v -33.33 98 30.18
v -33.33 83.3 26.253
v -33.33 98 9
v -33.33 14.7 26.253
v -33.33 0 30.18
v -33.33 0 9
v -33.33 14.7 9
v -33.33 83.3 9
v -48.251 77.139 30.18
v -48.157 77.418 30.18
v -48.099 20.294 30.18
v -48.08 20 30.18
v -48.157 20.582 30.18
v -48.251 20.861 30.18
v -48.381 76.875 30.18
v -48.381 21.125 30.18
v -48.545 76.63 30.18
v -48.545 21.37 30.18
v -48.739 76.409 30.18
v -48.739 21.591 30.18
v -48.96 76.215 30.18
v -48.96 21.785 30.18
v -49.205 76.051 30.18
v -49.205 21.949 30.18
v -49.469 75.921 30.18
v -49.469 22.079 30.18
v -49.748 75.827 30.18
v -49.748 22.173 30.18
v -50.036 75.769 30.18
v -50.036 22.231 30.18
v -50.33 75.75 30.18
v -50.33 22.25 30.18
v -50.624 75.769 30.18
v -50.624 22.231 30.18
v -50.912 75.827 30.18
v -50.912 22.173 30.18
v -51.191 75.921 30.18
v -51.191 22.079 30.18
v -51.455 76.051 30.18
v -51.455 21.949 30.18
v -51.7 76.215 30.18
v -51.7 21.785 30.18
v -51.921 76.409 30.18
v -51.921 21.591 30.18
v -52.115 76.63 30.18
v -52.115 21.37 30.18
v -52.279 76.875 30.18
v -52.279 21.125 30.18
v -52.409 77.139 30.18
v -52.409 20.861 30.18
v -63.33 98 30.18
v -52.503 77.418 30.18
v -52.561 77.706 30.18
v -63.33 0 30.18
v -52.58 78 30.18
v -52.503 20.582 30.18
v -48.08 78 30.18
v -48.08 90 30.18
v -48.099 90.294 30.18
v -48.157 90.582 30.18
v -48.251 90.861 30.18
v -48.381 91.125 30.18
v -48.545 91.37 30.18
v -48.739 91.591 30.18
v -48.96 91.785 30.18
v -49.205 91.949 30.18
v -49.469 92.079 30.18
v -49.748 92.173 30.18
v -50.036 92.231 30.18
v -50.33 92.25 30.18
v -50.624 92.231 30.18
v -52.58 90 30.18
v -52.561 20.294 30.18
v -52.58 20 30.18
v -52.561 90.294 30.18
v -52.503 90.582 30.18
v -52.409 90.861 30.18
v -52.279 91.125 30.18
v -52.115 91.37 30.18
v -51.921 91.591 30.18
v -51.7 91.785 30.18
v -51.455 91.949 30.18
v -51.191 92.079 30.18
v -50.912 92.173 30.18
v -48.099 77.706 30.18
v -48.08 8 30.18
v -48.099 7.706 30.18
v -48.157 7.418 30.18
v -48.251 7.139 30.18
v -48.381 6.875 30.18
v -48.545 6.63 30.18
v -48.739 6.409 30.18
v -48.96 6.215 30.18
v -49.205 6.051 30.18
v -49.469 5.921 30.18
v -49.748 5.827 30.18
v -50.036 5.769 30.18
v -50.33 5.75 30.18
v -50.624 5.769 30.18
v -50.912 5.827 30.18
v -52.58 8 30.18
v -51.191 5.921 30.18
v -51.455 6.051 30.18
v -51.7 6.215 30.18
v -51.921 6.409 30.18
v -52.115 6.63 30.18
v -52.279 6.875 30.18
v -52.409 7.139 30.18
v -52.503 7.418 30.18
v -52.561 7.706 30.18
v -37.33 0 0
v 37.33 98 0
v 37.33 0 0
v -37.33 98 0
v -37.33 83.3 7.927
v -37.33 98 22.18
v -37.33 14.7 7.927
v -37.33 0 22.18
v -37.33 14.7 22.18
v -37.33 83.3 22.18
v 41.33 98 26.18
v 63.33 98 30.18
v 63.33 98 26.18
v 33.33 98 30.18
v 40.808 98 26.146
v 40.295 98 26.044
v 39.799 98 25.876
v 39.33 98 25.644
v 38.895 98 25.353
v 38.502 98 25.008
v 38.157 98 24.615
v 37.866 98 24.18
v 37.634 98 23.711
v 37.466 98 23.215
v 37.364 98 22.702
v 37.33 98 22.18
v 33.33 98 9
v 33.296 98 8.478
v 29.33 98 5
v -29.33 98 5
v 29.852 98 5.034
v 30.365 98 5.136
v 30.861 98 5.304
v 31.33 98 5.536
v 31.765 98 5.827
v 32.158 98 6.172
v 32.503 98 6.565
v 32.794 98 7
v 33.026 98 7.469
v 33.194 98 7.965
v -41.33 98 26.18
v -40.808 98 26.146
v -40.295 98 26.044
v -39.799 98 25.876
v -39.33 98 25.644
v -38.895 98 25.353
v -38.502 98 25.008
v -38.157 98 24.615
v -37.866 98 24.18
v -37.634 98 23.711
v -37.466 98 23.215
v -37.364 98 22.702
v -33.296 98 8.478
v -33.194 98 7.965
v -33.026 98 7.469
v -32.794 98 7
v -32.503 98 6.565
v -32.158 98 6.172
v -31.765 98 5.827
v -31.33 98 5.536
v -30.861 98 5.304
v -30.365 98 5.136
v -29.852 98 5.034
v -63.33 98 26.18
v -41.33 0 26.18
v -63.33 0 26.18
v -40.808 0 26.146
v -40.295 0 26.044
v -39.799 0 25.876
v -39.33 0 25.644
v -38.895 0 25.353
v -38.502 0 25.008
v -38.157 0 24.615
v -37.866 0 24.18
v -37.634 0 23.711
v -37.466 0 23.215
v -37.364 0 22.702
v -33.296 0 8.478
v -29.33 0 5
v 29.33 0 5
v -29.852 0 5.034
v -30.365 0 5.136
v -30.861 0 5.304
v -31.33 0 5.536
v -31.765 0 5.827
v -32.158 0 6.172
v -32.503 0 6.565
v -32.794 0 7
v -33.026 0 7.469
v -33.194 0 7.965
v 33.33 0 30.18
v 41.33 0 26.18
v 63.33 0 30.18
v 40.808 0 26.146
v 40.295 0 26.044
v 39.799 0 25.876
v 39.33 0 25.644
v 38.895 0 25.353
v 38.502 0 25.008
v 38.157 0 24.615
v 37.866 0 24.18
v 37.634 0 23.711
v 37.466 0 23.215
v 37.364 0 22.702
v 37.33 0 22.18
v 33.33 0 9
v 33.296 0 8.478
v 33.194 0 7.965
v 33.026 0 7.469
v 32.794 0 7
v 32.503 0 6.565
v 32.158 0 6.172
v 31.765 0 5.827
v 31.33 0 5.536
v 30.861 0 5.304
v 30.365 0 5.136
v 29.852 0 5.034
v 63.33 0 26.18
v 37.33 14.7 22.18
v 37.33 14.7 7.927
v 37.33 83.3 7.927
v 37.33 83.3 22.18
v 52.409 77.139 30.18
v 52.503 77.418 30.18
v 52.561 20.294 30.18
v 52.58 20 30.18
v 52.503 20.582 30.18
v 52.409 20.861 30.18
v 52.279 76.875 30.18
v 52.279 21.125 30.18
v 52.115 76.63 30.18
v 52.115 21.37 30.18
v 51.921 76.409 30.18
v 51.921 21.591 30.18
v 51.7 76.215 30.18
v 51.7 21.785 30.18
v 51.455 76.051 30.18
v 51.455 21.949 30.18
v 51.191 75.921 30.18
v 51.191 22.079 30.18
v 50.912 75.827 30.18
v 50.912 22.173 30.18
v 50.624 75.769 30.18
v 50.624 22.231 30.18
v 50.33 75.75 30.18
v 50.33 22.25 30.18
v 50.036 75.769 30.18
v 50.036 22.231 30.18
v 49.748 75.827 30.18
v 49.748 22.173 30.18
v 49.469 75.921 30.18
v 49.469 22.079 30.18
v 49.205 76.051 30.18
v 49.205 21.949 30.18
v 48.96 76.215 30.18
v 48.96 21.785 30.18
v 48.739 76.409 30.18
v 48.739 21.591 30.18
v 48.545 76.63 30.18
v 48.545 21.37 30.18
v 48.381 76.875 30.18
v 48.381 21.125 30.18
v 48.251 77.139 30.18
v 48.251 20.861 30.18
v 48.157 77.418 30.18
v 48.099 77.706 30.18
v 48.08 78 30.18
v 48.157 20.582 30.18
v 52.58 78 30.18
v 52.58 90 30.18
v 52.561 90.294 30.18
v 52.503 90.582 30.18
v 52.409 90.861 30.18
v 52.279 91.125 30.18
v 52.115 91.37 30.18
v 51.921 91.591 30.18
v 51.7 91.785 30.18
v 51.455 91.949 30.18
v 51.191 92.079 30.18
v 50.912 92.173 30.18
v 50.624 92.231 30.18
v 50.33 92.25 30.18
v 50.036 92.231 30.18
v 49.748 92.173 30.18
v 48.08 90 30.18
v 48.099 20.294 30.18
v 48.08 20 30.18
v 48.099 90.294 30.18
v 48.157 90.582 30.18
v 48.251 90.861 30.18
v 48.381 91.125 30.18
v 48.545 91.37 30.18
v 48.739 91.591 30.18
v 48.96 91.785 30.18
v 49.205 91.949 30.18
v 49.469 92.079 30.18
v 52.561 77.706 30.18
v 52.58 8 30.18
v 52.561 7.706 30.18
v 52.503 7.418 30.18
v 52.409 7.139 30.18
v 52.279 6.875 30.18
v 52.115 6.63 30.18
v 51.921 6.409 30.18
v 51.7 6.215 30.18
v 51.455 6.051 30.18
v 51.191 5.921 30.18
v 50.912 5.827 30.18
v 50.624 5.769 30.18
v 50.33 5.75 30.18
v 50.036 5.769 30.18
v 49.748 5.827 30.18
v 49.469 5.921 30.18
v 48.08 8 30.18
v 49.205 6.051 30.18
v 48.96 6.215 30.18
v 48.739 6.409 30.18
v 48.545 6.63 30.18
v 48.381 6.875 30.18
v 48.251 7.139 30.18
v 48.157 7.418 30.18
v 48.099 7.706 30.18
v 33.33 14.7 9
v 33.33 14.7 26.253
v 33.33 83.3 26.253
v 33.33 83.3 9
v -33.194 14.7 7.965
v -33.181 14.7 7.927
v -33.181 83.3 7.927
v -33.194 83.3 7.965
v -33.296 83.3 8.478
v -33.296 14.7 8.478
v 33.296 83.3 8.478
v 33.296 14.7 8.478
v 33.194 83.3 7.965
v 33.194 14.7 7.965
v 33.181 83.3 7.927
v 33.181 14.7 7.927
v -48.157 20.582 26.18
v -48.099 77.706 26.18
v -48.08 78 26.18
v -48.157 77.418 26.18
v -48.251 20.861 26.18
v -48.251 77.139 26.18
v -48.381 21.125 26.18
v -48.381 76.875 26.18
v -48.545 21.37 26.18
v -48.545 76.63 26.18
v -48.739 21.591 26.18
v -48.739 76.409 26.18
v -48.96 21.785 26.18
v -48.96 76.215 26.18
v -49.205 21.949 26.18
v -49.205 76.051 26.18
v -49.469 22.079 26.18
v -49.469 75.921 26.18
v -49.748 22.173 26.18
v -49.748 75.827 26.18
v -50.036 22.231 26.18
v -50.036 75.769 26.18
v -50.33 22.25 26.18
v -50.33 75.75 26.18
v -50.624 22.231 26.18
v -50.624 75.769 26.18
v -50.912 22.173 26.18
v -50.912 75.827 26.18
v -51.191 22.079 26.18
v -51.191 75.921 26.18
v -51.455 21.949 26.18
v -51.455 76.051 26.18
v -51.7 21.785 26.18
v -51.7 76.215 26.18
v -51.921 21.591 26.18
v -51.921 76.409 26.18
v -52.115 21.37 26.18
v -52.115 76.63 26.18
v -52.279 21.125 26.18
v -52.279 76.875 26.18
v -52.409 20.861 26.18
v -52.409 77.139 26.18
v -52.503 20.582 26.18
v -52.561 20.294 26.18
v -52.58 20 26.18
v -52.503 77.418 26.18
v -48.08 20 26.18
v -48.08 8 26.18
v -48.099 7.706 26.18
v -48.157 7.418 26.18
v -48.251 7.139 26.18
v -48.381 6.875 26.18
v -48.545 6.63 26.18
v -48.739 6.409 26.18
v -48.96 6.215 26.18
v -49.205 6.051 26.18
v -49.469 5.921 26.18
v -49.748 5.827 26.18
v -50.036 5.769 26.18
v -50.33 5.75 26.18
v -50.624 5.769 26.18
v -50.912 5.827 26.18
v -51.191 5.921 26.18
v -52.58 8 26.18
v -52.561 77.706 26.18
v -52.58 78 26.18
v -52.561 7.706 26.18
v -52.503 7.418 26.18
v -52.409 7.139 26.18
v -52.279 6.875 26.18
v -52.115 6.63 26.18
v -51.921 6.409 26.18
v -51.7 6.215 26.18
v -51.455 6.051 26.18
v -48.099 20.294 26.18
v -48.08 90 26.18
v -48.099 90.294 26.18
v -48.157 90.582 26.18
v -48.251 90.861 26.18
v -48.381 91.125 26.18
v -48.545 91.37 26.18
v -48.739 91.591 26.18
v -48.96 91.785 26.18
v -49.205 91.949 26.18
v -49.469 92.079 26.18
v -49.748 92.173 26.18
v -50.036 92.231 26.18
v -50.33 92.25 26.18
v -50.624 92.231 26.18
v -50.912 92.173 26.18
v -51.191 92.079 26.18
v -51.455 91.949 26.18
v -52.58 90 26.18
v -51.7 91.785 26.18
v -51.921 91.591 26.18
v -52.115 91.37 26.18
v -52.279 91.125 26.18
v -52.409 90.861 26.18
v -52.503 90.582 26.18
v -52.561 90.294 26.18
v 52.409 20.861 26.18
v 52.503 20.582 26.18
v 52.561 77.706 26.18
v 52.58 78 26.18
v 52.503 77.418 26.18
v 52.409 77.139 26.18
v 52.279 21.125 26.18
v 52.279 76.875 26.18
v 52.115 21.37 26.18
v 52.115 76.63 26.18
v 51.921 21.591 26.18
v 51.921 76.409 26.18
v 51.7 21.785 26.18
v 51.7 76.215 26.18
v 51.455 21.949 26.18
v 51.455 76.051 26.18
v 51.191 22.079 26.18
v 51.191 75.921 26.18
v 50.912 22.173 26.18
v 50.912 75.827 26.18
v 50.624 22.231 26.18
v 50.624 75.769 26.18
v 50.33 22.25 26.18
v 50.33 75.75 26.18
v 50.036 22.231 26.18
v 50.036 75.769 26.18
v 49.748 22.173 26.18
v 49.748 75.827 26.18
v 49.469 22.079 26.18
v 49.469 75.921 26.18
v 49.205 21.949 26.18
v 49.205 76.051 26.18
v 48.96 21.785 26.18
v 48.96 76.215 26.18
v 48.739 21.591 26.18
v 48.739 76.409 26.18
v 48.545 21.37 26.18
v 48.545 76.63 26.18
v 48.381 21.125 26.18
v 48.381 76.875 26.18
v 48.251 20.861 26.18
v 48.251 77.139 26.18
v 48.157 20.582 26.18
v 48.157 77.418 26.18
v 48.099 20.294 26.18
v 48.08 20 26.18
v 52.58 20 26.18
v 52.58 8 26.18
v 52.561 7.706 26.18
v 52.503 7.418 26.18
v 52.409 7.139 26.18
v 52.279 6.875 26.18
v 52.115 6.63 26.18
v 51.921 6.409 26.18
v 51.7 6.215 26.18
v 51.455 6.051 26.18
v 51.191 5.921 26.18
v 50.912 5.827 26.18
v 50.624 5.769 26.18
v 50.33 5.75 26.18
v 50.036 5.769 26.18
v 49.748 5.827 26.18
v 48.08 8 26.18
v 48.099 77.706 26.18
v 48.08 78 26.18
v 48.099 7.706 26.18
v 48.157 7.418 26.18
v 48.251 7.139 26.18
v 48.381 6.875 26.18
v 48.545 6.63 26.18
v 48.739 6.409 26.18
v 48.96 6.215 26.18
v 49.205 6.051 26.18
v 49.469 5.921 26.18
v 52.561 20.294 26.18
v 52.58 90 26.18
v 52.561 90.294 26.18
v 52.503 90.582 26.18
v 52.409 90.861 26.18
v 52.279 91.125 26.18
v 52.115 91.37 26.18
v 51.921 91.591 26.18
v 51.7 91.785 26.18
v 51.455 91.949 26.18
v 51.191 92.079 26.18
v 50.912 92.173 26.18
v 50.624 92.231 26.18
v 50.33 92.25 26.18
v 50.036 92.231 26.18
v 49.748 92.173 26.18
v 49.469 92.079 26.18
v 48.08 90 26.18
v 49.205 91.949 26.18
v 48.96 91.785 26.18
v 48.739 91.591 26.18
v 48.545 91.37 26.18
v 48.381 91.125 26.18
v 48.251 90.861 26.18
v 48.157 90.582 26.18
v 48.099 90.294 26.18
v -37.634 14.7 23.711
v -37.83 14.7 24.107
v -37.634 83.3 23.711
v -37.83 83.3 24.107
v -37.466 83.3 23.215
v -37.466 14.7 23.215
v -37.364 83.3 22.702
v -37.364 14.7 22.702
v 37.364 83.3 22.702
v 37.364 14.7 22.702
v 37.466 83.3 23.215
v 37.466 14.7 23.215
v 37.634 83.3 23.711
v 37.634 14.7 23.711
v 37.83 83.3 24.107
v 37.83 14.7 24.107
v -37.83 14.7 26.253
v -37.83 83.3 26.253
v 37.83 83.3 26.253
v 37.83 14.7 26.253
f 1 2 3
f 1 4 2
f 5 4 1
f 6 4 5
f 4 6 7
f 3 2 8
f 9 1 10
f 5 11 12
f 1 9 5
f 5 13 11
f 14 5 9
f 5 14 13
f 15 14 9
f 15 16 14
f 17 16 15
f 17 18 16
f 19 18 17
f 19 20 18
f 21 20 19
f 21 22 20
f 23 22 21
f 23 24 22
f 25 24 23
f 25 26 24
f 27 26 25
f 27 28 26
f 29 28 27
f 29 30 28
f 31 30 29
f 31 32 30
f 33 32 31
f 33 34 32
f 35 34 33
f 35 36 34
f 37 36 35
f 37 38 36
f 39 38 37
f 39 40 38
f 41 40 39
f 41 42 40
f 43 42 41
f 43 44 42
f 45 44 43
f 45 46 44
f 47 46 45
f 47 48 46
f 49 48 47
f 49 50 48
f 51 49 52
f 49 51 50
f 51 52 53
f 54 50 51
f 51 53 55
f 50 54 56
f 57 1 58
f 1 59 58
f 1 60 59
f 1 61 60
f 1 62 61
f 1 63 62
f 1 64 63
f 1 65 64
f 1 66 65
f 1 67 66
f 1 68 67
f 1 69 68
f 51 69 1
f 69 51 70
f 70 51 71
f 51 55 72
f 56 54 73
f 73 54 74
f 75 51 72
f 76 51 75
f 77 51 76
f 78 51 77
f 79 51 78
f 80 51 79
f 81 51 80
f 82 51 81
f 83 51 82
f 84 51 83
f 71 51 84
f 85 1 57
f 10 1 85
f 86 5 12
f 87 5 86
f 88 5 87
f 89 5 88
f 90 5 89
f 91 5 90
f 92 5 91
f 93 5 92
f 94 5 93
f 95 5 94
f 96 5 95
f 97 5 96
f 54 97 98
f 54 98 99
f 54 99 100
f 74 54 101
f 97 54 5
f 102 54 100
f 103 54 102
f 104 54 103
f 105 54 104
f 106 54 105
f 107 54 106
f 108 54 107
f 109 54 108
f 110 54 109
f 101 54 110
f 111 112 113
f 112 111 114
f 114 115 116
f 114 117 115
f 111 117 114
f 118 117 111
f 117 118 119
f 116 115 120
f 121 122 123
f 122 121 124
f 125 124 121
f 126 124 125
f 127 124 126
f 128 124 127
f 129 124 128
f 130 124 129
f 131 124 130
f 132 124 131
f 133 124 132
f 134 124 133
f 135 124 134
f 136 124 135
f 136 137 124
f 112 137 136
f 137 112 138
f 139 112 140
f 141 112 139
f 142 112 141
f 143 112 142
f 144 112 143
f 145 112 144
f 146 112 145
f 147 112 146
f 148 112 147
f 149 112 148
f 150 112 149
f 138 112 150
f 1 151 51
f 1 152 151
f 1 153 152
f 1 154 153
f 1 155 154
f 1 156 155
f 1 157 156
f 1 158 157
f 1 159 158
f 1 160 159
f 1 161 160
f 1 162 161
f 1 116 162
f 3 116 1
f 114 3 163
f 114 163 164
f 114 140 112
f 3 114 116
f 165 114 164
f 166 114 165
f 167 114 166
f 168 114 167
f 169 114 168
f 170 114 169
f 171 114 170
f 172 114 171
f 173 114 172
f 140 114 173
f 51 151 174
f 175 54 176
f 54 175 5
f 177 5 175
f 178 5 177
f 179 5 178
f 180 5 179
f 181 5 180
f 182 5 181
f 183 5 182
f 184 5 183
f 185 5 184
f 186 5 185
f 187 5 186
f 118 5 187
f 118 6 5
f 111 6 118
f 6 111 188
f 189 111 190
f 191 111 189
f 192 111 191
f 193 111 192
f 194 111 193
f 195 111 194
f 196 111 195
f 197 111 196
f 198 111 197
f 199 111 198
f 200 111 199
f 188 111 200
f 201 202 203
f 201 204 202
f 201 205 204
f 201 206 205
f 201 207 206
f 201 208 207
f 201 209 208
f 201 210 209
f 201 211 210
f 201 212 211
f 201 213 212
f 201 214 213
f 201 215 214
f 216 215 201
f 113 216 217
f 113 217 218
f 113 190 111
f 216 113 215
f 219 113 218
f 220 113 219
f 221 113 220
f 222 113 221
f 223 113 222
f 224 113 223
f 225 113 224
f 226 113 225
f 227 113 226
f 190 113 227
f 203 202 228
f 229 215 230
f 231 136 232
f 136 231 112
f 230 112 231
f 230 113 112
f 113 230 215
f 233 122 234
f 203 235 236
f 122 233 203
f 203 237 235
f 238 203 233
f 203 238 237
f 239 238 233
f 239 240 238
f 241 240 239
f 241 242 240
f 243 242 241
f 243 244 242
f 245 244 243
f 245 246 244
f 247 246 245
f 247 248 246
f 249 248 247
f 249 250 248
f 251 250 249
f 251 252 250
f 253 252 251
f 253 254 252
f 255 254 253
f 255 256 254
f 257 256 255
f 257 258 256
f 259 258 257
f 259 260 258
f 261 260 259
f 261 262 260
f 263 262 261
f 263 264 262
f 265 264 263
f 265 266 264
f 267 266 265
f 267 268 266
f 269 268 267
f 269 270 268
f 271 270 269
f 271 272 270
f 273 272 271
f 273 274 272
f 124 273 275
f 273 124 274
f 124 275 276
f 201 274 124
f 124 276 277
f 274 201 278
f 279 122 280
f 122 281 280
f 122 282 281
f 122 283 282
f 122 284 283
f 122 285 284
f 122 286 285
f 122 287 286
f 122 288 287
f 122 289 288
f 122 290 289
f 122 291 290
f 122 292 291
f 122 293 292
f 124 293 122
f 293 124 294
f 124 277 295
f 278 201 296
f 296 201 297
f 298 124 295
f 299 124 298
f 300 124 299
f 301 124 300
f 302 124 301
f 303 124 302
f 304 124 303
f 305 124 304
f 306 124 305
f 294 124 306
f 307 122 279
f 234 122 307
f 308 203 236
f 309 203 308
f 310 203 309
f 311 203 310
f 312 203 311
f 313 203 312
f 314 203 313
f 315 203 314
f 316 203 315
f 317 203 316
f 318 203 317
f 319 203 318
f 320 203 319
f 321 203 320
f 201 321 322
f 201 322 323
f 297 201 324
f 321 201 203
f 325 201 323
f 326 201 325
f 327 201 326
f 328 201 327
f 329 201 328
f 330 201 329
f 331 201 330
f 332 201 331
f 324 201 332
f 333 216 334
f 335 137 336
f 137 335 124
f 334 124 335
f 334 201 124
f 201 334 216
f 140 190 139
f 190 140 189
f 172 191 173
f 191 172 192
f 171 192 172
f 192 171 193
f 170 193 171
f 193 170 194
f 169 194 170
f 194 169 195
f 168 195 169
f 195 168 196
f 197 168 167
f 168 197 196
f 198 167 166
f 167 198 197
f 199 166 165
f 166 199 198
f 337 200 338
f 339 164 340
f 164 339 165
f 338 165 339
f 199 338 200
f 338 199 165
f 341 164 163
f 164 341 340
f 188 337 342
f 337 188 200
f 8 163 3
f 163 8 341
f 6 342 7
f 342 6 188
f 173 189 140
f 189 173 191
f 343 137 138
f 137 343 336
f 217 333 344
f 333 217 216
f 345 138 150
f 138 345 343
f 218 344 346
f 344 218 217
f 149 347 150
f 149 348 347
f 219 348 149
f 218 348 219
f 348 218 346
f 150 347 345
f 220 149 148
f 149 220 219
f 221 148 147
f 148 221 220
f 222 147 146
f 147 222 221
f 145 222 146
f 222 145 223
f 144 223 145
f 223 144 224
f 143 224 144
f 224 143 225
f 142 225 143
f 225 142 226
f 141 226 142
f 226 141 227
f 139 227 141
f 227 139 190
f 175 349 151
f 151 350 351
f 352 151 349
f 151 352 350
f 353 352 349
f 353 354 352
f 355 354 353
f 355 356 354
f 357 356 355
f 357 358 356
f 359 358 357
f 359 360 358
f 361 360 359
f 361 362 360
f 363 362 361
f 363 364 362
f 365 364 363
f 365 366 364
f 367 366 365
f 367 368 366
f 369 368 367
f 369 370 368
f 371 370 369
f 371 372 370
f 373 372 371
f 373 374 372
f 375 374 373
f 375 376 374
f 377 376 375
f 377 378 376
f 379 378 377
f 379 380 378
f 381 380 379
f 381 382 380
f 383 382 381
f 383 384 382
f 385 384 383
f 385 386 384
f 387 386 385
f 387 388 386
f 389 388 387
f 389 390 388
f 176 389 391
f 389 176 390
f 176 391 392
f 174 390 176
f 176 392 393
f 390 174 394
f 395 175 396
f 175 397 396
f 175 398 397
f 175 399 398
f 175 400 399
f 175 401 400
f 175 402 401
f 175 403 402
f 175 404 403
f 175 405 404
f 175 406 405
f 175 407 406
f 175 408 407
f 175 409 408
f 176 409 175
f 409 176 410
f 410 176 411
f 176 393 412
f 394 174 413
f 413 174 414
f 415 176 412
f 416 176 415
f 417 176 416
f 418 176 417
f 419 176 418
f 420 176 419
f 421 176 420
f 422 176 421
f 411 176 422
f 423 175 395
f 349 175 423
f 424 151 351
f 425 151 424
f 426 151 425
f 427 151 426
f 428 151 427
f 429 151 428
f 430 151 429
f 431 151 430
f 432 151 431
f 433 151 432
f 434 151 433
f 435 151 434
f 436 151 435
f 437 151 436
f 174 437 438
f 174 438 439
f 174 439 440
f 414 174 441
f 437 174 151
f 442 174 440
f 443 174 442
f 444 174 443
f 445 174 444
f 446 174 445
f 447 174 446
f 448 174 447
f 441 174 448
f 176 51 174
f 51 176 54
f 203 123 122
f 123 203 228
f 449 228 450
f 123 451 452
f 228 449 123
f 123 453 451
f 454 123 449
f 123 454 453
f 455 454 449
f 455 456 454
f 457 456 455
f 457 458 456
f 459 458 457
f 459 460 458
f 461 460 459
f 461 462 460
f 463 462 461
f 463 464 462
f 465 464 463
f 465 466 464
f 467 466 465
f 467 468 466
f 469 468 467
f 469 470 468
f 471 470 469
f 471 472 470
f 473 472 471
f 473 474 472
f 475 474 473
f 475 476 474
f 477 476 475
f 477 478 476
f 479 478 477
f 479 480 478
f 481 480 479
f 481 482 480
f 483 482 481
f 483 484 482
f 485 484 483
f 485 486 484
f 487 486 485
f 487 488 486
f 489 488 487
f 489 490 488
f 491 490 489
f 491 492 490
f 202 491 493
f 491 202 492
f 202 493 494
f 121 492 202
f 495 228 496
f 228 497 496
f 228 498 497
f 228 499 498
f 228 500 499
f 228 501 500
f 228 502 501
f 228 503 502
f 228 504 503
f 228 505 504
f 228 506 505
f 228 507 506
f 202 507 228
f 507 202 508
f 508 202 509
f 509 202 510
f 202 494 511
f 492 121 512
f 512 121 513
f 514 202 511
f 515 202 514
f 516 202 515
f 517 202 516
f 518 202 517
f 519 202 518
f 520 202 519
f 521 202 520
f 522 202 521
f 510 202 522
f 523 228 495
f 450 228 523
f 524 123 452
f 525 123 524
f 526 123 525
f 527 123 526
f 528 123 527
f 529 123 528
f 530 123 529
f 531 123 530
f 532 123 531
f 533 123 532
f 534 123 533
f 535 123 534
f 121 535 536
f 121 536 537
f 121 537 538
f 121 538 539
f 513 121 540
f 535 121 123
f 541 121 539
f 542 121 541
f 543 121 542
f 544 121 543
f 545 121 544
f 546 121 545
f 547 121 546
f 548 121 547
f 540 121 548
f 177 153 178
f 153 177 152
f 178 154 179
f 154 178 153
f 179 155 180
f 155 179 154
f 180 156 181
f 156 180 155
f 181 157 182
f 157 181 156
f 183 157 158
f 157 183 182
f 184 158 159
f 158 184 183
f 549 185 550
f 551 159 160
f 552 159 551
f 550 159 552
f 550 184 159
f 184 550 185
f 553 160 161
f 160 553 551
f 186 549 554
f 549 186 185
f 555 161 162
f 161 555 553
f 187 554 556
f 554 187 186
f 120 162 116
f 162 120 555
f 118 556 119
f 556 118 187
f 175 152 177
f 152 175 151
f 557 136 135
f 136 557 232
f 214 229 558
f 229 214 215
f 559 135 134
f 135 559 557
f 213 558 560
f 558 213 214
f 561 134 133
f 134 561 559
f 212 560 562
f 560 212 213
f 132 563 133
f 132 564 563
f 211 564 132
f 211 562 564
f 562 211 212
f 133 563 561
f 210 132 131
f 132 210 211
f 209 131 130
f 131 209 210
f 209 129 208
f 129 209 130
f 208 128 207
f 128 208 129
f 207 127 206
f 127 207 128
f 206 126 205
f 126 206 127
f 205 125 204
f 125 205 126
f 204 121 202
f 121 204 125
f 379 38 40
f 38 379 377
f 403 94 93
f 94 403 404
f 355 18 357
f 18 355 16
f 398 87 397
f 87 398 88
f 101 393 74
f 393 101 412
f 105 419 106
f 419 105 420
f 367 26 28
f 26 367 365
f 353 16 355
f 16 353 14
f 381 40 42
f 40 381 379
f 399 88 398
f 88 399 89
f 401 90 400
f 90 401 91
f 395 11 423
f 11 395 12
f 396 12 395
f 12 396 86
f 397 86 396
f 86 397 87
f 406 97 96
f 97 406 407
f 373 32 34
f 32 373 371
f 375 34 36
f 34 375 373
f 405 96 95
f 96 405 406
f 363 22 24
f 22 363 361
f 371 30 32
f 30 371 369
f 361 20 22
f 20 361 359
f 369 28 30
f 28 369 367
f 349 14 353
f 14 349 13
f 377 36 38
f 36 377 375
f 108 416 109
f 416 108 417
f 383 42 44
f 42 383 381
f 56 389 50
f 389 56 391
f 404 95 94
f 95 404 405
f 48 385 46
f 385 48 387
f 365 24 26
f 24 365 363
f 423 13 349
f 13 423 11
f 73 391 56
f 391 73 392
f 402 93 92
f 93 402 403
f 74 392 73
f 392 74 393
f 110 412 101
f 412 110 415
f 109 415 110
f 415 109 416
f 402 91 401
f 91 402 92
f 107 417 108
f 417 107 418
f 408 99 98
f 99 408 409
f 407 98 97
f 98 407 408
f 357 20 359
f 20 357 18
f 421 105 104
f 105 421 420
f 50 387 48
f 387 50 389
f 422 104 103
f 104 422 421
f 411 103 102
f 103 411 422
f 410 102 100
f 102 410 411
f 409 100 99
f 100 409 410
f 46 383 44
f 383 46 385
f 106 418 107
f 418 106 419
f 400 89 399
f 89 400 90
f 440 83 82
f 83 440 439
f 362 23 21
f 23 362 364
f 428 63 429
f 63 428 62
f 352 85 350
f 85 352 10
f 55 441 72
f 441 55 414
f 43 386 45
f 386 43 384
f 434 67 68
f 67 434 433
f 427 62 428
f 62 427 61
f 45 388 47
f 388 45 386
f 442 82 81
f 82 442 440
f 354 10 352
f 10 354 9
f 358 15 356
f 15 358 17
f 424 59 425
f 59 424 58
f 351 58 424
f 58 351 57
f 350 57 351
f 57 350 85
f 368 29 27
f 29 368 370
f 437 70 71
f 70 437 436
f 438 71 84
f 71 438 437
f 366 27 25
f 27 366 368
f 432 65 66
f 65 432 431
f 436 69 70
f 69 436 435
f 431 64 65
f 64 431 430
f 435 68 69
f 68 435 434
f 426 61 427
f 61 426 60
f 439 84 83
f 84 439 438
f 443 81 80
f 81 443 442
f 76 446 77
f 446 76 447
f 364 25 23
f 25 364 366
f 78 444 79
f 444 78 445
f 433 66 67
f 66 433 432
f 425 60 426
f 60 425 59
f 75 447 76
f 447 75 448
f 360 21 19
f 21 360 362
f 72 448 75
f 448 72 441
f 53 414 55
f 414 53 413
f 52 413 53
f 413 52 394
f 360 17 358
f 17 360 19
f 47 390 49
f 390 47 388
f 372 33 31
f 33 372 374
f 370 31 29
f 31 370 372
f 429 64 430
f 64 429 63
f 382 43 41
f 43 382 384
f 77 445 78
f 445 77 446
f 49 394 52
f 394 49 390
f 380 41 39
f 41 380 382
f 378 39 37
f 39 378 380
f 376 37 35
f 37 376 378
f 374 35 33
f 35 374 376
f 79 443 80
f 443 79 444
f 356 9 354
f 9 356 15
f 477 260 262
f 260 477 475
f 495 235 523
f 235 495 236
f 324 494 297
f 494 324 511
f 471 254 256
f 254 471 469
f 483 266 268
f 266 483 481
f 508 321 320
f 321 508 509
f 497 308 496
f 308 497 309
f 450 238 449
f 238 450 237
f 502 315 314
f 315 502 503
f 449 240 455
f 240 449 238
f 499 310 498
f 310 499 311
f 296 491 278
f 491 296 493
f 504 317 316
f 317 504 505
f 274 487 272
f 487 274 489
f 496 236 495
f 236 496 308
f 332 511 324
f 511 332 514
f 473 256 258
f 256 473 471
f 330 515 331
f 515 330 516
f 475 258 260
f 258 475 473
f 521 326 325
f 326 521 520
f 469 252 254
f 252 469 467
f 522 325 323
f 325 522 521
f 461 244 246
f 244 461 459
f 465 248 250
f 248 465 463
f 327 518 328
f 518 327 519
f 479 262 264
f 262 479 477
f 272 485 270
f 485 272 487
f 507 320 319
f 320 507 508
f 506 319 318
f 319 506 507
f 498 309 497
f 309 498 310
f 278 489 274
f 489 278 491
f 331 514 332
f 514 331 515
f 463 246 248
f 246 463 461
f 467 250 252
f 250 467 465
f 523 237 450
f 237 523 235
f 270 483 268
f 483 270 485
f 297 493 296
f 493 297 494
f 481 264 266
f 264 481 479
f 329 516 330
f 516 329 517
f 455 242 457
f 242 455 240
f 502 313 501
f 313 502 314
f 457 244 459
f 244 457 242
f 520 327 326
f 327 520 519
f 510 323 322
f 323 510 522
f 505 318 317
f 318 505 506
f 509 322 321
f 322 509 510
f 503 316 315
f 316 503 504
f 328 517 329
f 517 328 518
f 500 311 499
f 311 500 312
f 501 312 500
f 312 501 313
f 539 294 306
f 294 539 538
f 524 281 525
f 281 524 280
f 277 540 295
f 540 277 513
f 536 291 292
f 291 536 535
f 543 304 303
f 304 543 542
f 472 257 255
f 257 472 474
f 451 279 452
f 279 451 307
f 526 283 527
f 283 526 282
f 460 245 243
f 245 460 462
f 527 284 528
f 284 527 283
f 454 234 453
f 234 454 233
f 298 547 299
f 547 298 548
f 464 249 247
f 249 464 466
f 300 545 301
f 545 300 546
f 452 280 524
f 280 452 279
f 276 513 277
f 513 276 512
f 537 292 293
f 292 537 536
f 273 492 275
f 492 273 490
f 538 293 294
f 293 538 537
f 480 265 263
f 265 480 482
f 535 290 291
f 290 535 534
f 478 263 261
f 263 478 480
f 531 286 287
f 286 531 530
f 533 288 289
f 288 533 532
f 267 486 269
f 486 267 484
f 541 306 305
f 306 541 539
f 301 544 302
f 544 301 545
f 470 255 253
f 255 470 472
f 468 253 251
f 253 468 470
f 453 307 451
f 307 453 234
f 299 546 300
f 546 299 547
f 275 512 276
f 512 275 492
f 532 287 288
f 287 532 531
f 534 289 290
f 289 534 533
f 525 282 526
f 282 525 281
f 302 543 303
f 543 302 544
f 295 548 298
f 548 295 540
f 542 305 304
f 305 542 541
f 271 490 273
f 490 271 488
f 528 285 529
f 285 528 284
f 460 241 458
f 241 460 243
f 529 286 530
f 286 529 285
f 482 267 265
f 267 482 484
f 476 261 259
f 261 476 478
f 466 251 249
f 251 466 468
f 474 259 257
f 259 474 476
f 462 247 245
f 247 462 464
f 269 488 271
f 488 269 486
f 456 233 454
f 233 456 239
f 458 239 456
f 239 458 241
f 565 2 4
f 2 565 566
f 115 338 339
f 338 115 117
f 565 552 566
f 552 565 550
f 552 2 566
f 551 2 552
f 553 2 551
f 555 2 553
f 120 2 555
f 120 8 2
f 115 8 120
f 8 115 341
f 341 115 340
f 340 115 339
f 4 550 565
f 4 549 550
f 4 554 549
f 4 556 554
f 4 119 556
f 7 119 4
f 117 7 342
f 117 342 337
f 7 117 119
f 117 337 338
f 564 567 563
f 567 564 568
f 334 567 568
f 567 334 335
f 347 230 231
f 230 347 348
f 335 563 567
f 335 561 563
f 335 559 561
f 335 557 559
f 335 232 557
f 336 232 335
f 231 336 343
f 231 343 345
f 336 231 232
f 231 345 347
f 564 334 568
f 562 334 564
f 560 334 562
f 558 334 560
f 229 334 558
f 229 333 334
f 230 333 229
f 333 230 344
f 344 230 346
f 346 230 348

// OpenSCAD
/*
Cable Mount - Single piece with connected shelves and reinforced transitions
===============================================================================
to build:

1. Prompt engineer with ChatGPT to create a scad file
2. Create stl file froma docker container running openscad
   ```bash
   j dotfiles
   cd desk-mounts
   docker run \
       -it \
       --rm \
       -v $(pwd):/openscad \
       -u $(id -u ${USER}):$(id -g ${USER}) \
       openscad/openscad:latest \
       openscad -o cable-mount.stl cable-mount.scad
   ```
3. render in OnShape

Here are the dimensions of the different pieces (height, width, depth)
from the perspective of power cable going into the back and the ports
showing right in front of you

- geekom (36.75,112.32,111.59)
- ugreen displaylink hub (25,160,78.39)
- kvm switch (38.03,140.53,67.36)
- geekom power brick (23.18,63.66,98)
- caldigit power brick (25.75,75.45,150)
*/

//////////////////////
// DEVICE DIMENSIONS
//////////////////////

device_height = 23.18; // height of the device (Z axis when looking head on from front)
device_width = 63.66;   // width of the device (X axis when looking head on from front)
device_depth = 98;     // depth of the device (Y axis when looking head on from front)

//////////////////////
// USER TUNING
//////////////////////
show_device = false;

rounded_radius = 4;
clearance = 1.5;     // clearance around device
wall = 4;            // main wall thickness

// device sits here
shelf_th = 5;

// Retention lip
lip_depth = 7;
lip_th = 4;

// Top flange (screws into desk)
flange_w = 26;
flange_th = 4;

hole_d = 4.5;
slot_len = 12;
hole_edge = 14;      // moved in from ends

// Fillet radius for wall-to-shelf transition (strengthening)
transition_fillet_r = 4;

// Lightweighting (safe/simple)
lighten = true;
window_y_scale = 0.70;
window_z_scale = 0.70;

// Base weight reduction
base_cutout = false;
base_cutout_margin = 12;  // leave this much material at edges

//////////////////////
// DERIVED
//////////////////////
inner_h = device_height + 2*clearance;
inner_span = device_width + 2*clearance;

$fn = 48;

//////////////////////
// HELPERS
//////////////////////
module elongated_slot(d, len, th){
  hull(){
    translate([-len/2,0,0]) cylinder(h=th+0.2, d=d);
    translate([ len/2,0,0]) cylinder(h=th+0.2, d=d);
  }
}

//////////////////////
// SINGLE UNIFIED MOUNT
//////////////////////
module cable_mount(){
  plate_d  = device_depth;                 // RUN length (Y)
  plate_h  = inner_h + flange_th;
  lip_z    = wall + inner_h + wall;
  eps = 0.01;

  difference(){
    union(){
      // Left wall
      translate([-inner_span/2 - wall, 0, 0])
        cube([wall, plate_d, plate_h]);

      // Right wall
      translate([inner_span/2, 0, 0])
        cube([wall, plate_d, plate_h]);

      // Connected shelf spanning the entire width
      // (lower than retention lips by device height)
      translate([-inner_span/2 - wall , 0, 0])
        cube([inner_span + 2*wall , plate_d, shelf_th]);

      // Reinforcement fillets at wall-to-shelf transitions (inside corners)
      // These add material where the shelf meets the walls for strength
      // Better approach: use cylinders to create the fillet
      // Left inner fillet
      translate([-inner_span/2, device_depth, shelf_th])
        rotate([90, 0, 0])
          linear_extrude(height=plate_d)
            difference(){
              square([transition_fillet_r, transition_fillet_r]);
              translate([transition_fillet_r, transition_fillet_r])
                circle(r=transition_fillet_r);
            }

      // Right inner fillet
      translate([inner_span/2, device_depth, shelf_th])
        rotate([90, 0, 0])
          linear_extrude(height=plate_d)
            difference(){
              translate([-transition_fillet_r, 0])
                square([transition_fillet_r, transition_fillet_r]);
              translate([-transition_fillet_r, transition_fillet_r])
                circle(r=transition_fillet_r);
            }

      // Left flange
      translate([-inner_span/2 - wall - flange_w, 0, plate_h - flange_th])
        cube([flange_w, plate_d, flange_th]);

      // Right flange
      translate([inner_span/2 + wall, 0, plate_h - flange_th])
        cube([flange_w, plate_d, flange_th]);

      // Reinforcement fillets at wall-to-flange transitions (outside corners)
      // These add material where the flange meets the wall for strength
      // Better approach: use cylinders to create the fillet
      // Left outer fillet
      translate([-inner_span/2 - wall, device_depth, inner_h])
        rotate([90, 180, 0])
          linear_extrude(height=plate_d)
            difference(){
              square([transition_fillet_r, transition_fillet_r]);
              translate([transition_fillet_r, transition_fillet_r])
                circle(r=transition_fillet_r);
            }

      // Right outer fillet
      translate([inner_span/2+wall, device_depth, inner_h])
        rotate([90, 180, 0])
          linear_extrude(height=plate_d)
            difference(){
              translate([-transition_fillet_r, 0])
                square([transition_fillet_r, transition_fillet_r]);
              translate([-transition_fillet_r, transition_fillet_r])
                circle(r=transition_fillet_r);
            }

    }

    // Left wall screw slots
    for (yy = [hole_edge, plate_d - hole_edge]){
      translate([-inner_span/2 - wall - flange_w/2, yy, plate_h - flange_th - 0.1])
        rotate([0,0,90])
          elongated_slot(hole_d, slot_len, flange_th);
    }

    // Right wall screw slots
    for (yy = [hole_edge, plate_d - hole_edge]){
      translate([inner_span/2 + wall + flange_w/2, yy, plate_h - flange_th - 0.1])
        rotate([0,0,90])
          elongated_slot(hole_d, slot_len, flange_th);
    }

    // Left wall lightening window
    if(lighten){
      translate([-inner_span/2 - wall - 0.5,
                 plate_d*(1-window_y_scale)/2,
                 wall + inner_h*(1-window_z_scale)/2])
        cube([wall+1,
              plate_d*window_y_scale,
              inner_h*window_z_scale]);
    }

    // Right wall lightening window
    if(lighten){
      translate([inner_span/2 - 0.5,
                 plate_d*(1-window_y_scale)/2,
                 wall + inner_h*(1-window_z_scale)/2])
        cube([wall+1,
              plate_d*window_y_scale,
              inner_h*window_z_scale]);
    }
    // Base weight reduction cutout
    if(base_cutout){
      // Calculate cutout dimensions (leave margin at edges for strength)
      cutout_width = inner_span + 2*wall - 2*base_cutout_margin;
      cutout_length = plate_d - 2*base_cutout_margin;
      cutout_depth = shelf_th - 1.5;  // leave bottom layer for strength
      // Center cutout in the base
      translate([
        -cutout_width/2,
        base_cutout_margin,
        1.5  // start above bottom layer
      ])
        cube([cutout_width, cutout_length, cutout_depth]);
    }
  }
}

//////////////////////
// DEVICE PREVIEW
//////////////////////
module device_mock(){
  color([0.15,0.15,0.15,0.45])
    translate([
      -device_width/2,
      (device_width - device_depth)/2,
      shelf_th
    ])
      cube([device_width, device_depth, device_height]);
}

//////////////////////
// RENDER
//////////////////////
if(show_device) device_mock();
cable_mount();
